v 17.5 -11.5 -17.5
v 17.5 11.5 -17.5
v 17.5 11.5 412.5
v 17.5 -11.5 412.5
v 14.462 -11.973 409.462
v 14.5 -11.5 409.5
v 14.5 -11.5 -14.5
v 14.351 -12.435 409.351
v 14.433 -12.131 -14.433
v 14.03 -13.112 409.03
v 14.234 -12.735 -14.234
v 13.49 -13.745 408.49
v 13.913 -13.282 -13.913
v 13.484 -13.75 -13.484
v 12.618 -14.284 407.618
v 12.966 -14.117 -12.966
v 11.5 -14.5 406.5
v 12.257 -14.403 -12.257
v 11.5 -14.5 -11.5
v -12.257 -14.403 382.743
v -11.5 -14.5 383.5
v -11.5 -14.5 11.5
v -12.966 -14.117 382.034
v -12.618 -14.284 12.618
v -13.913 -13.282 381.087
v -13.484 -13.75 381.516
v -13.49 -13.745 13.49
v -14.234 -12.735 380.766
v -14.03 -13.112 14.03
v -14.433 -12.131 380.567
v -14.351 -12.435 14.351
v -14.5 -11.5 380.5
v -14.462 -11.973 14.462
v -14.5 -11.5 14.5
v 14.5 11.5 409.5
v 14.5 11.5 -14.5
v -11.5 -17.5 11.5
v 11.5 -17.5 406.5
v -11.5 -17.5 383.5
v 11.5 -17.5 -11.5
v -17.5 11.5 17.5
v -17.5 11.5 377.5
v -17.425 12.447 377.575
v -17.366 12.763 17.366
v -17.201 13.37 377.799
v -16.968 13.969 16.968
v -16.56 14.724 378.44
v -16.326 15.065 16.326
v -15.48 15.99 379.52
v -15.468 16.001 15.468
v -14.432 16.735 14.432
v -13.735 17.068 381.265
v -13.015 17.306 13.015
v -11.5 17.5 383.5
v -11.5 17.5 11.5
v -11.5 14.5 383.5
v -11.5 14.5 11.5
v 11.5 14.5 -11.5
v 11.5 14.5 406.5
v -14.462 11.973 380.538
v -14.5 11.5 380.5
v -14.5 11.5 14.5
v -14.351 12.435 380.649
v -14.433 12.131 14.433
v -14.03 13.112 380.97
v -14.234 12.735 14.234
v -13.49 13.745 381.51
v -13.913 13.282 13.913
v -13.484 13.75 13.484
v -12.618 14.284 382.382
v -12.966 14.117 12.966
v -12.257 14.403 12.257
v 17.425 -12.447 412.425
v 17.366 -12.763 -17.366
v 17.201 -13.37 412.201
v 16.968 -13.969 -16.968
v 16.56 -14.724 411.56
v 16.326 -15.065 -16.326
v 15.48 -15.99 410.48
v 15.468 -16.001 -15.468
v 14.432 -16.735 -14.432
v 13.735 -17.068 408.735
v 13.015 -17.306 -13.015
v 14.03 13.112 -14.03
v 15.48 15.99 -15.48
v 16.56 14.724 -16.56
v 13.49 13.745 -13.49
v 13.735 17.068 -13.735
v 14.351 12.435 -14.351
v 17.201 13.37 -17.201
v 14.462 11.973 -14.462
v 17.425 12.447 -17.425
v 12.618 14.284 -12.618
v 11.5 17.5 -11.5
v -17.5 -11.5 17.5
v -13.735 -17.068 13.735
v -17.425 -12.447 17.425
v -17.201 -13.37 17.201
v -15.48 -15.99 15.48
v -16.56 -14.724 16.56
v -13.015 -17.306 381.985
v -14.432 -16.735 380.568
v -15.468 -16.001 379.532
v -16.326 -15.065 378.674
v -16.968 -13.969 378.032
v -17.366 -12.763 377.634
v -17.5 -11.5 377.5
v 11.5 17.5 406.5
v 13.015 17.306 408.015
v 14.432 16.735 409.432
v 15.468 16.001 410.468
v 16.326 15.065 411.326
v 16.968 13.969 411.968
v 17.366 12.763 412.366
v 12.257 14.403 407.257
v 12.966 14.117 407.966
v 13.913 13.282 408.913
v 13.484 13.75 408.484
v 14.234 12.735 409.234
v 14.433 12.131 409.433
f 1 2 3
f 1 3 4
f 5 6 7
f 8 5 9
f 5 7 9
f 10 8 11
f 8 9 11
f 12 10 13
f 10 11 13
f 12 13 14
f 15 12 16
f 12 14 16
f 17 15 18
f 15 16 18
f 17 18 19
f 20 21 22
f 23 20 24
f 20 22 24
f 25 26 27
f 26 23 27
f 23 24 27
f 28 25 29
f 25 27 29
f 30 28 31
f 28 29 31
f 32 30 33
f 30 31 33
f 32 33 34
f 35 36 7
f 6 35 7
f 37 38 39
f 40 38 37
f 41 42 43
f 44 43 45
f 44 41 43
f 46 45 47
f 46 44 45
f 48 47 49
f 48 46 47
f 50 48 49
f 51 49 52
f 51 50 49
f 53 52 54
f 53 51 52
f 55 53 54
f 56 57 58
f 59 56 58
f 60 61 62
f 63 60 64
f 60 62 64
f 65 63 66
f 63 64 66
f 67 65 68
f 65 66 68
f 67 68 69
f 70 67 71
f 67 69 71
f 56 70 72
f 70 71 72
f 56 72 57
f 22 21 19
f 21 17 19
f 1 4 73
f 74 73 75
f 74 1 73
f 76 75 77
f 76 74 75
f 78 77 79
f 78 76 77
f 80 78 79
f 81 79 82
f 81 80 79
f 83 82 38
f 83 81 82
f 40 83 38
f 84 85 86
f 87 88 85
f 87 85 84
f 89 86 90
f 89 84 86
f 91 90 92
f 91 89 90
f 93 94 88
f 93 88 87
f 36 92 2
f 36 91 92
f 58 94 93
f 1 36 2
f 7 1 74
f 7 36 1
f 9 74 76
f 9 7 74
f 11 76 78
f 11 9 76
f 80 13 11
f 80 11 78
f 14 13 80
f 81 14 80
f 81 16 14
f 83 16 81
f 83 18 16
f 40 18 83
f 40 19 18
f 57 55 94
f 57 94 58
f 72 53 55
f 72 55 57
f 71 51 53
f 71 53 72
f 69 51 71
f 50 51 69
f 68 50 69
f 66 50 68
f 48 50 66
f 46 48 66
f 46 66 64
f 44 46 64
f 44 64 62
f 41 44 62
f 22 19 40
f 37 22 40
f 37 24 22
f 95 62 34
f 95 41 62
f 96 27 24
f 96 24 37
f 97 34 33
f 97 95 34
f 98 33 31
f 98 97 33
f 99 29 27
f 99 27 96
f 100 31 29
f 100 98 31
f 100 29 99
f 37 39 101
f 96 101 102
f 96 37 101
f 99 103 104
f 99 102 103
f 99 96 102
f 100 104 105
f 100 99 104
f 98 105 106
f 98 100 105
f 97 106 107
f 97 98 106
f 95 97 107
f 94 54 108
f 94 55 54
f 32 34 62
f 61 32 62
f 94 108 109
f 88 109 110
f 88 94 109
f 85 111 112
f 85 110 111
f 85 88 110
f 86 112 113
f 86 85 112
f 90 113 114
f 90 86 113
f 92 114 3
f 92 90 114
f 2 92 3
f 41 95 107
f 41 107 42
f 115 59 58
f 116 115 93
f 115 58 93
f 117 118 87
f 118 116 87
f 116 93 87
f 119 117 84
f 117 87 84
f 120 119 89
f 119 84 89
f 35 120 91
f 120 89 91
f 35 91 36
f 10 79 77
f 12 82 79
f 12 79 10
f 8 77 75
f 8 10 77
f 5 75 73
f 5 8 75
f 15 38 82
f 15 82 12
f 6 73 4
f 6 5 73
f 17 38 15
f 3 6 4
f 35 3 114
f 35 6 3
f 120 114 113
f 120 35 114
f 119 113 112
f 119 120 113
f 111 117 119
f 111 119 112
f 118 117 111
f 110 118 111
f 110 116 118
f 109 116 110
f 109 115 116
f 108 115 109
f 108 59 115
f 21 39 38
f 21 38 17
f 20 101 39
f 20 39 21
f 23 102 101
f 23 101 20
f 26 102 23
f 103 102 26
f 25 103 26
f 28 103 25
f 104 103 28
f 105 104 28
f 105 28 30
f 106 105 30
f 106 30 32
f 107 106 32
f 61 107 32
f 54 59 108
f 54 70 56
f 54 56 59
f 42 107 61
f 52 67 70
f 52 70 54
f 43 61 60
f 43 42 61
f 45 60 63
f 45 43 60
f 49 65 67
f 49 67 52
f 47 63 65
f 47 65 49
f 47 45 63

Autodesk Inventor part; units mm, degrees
ref_plane "Start plane" through (0, 0, -17.5) normal (0, 0, 1) x (1, 0, 0)
ref_plane "End plane" through (0, 0, 412.5) normal (0, 0, 1) x (1, 0, 0)
sketch "Sketch" plane through (0, 0, 0) normal (0, 0, 1) x (1, 0, 0)
  line L0 (-17.5, -11.5) -> (-17.5, 11.5)
  line L1 (-11.5, 17.5) -> (11.5, 17.5)
  line L2 (17.5, 11.5) -> (17.5, -11.5)
  line L3 (11.5, -17.5) -> (-11.5, -17.5)
  arc A0 (-17.5, -11.5) -> (-11.5, -17.5) centre (-11.5, -11.5) ccw
  arc A1 (-11.5, 17.5) -> (-17.5, 11.5) centre (-11.5, 11.5) ccw
  arc A2 (17.5, 11.5) -> (11.5, 17.5) centre (11.5, 11.5) ccw
  arc A3 (11.5, -17.5) -> (17.5, -11.5) centre (11.5, -11.5) ccw
  arc A4 (-11.5, 14.5) -> (-14.5, 11.5) centre (-11.5, 11.5) ccw
  line L4 (-11.5, 14.5) -> (11.5, 14.5)
  arc A5 (14.5, 11.5) -> (11.5, 14.5) centre (11.5, 11.5) ccw
  line L5 (14.5, 11.5) -> (14.5, -11.5)
  arc A6 (11.5, -14.5) -> (14.5, -11.5) centre (11.5, -11.5) ccw
  line L6 (11.5, -14.5) -> (-11.5, -14.5)
  arc A7 (-14.5, -11.5) -> (-11.5, -14.5) centre (-11.5, -11.5) ccw
  line L7 (-14.5, -11.5) -> (-14.5, 11.5)
  line L8 (0, 25.6598) -> (0, -25.6598) construction
  line L9 (-25.6598, 0) -> (25.6598, 0) construction
  dimension "d7" = 6
  dimension "d10" = 35
  dimension "d11" = 35
  dimension "d12" = 3
  dimension "d15" = 17.5
  dimension "d16" = 17.5
extrude "Body" add sketch "Sketch" along normal up to surface (430 mm away) from surface at -17.5
sketch "Sketch3" plane through (0, 0, 0) normal (0, 0, 1) x (1, 0, 0)
  line L0 (0, 0) -> (10, 0)
ref_plane "Work Plane3" through (0, 0, 0) normal (0, -1, 0) x (1, 0, 0)
sketch "Sketch4" plane through (0, 0, 0) normal (0, -1, 0) x (1, 0, 0)
  line L0 (-2, -17.5) -> (12, -17.5)
  line L1 (-2, 412.5) -> (12, 412.5)
  dimension "d18" = 430
ref_plane "Work Plane12" through (0, 180, -17.5) normal (0, 0, -1) x (-1, 0, 0)
split "Split6" plane through (0, 180, -17.5) removes the side toward (0, 0, -1)
ref_plane "Work Plane13" through (17.5, 0, -17.5) normal (-0.7071, 0, -0.7071) x (-0.7071, 0, 0.7071)
split "Split7" plane through (17.5, 0, -17.5) removes the side toward (-0.7071, 0, -0.7071)
ref_plane "Work Plane14" through (17.5, 0, 412.5) normal (-0.7071, 0, 0.7071) x (0.7071, 0, 0.7071)
split "Split8" plane through (17.5, 0, 412.5) removes the side toward (-0.7071, 0, 0.7071)
equation "\"d7\" = G_IR"
equation "\"d10\" = G_H"
equation "\"d11\" = G_W"
equation "\"d12\" = G_T"
equation "\"d15\" = 0.5 * d10"
equation "\"d16\" = 0.5 * d11"
equation "\"d3\" = G_L"
equation "\"G_W\" = 35"
equation "\"G_H\" = 35"
equation "\"G_T\" = 3"
equation "\"G_IR\" = 6"
equation "\"G_L\" = d18"
equation "\"G_OFFSET_START\" = 17.5"
equation "\"G_OFFSET_END\" = 17.5"
equation "\"d13\" = -G_OFFSET_START"
equation "\"d14\" = G_OFFSET_END + B_L"
equation "\"B_L\" = 395"
properties part number "AS 1163 - C350L0 35x35x3.0 SHS - 430" material "Steel, Mild"
